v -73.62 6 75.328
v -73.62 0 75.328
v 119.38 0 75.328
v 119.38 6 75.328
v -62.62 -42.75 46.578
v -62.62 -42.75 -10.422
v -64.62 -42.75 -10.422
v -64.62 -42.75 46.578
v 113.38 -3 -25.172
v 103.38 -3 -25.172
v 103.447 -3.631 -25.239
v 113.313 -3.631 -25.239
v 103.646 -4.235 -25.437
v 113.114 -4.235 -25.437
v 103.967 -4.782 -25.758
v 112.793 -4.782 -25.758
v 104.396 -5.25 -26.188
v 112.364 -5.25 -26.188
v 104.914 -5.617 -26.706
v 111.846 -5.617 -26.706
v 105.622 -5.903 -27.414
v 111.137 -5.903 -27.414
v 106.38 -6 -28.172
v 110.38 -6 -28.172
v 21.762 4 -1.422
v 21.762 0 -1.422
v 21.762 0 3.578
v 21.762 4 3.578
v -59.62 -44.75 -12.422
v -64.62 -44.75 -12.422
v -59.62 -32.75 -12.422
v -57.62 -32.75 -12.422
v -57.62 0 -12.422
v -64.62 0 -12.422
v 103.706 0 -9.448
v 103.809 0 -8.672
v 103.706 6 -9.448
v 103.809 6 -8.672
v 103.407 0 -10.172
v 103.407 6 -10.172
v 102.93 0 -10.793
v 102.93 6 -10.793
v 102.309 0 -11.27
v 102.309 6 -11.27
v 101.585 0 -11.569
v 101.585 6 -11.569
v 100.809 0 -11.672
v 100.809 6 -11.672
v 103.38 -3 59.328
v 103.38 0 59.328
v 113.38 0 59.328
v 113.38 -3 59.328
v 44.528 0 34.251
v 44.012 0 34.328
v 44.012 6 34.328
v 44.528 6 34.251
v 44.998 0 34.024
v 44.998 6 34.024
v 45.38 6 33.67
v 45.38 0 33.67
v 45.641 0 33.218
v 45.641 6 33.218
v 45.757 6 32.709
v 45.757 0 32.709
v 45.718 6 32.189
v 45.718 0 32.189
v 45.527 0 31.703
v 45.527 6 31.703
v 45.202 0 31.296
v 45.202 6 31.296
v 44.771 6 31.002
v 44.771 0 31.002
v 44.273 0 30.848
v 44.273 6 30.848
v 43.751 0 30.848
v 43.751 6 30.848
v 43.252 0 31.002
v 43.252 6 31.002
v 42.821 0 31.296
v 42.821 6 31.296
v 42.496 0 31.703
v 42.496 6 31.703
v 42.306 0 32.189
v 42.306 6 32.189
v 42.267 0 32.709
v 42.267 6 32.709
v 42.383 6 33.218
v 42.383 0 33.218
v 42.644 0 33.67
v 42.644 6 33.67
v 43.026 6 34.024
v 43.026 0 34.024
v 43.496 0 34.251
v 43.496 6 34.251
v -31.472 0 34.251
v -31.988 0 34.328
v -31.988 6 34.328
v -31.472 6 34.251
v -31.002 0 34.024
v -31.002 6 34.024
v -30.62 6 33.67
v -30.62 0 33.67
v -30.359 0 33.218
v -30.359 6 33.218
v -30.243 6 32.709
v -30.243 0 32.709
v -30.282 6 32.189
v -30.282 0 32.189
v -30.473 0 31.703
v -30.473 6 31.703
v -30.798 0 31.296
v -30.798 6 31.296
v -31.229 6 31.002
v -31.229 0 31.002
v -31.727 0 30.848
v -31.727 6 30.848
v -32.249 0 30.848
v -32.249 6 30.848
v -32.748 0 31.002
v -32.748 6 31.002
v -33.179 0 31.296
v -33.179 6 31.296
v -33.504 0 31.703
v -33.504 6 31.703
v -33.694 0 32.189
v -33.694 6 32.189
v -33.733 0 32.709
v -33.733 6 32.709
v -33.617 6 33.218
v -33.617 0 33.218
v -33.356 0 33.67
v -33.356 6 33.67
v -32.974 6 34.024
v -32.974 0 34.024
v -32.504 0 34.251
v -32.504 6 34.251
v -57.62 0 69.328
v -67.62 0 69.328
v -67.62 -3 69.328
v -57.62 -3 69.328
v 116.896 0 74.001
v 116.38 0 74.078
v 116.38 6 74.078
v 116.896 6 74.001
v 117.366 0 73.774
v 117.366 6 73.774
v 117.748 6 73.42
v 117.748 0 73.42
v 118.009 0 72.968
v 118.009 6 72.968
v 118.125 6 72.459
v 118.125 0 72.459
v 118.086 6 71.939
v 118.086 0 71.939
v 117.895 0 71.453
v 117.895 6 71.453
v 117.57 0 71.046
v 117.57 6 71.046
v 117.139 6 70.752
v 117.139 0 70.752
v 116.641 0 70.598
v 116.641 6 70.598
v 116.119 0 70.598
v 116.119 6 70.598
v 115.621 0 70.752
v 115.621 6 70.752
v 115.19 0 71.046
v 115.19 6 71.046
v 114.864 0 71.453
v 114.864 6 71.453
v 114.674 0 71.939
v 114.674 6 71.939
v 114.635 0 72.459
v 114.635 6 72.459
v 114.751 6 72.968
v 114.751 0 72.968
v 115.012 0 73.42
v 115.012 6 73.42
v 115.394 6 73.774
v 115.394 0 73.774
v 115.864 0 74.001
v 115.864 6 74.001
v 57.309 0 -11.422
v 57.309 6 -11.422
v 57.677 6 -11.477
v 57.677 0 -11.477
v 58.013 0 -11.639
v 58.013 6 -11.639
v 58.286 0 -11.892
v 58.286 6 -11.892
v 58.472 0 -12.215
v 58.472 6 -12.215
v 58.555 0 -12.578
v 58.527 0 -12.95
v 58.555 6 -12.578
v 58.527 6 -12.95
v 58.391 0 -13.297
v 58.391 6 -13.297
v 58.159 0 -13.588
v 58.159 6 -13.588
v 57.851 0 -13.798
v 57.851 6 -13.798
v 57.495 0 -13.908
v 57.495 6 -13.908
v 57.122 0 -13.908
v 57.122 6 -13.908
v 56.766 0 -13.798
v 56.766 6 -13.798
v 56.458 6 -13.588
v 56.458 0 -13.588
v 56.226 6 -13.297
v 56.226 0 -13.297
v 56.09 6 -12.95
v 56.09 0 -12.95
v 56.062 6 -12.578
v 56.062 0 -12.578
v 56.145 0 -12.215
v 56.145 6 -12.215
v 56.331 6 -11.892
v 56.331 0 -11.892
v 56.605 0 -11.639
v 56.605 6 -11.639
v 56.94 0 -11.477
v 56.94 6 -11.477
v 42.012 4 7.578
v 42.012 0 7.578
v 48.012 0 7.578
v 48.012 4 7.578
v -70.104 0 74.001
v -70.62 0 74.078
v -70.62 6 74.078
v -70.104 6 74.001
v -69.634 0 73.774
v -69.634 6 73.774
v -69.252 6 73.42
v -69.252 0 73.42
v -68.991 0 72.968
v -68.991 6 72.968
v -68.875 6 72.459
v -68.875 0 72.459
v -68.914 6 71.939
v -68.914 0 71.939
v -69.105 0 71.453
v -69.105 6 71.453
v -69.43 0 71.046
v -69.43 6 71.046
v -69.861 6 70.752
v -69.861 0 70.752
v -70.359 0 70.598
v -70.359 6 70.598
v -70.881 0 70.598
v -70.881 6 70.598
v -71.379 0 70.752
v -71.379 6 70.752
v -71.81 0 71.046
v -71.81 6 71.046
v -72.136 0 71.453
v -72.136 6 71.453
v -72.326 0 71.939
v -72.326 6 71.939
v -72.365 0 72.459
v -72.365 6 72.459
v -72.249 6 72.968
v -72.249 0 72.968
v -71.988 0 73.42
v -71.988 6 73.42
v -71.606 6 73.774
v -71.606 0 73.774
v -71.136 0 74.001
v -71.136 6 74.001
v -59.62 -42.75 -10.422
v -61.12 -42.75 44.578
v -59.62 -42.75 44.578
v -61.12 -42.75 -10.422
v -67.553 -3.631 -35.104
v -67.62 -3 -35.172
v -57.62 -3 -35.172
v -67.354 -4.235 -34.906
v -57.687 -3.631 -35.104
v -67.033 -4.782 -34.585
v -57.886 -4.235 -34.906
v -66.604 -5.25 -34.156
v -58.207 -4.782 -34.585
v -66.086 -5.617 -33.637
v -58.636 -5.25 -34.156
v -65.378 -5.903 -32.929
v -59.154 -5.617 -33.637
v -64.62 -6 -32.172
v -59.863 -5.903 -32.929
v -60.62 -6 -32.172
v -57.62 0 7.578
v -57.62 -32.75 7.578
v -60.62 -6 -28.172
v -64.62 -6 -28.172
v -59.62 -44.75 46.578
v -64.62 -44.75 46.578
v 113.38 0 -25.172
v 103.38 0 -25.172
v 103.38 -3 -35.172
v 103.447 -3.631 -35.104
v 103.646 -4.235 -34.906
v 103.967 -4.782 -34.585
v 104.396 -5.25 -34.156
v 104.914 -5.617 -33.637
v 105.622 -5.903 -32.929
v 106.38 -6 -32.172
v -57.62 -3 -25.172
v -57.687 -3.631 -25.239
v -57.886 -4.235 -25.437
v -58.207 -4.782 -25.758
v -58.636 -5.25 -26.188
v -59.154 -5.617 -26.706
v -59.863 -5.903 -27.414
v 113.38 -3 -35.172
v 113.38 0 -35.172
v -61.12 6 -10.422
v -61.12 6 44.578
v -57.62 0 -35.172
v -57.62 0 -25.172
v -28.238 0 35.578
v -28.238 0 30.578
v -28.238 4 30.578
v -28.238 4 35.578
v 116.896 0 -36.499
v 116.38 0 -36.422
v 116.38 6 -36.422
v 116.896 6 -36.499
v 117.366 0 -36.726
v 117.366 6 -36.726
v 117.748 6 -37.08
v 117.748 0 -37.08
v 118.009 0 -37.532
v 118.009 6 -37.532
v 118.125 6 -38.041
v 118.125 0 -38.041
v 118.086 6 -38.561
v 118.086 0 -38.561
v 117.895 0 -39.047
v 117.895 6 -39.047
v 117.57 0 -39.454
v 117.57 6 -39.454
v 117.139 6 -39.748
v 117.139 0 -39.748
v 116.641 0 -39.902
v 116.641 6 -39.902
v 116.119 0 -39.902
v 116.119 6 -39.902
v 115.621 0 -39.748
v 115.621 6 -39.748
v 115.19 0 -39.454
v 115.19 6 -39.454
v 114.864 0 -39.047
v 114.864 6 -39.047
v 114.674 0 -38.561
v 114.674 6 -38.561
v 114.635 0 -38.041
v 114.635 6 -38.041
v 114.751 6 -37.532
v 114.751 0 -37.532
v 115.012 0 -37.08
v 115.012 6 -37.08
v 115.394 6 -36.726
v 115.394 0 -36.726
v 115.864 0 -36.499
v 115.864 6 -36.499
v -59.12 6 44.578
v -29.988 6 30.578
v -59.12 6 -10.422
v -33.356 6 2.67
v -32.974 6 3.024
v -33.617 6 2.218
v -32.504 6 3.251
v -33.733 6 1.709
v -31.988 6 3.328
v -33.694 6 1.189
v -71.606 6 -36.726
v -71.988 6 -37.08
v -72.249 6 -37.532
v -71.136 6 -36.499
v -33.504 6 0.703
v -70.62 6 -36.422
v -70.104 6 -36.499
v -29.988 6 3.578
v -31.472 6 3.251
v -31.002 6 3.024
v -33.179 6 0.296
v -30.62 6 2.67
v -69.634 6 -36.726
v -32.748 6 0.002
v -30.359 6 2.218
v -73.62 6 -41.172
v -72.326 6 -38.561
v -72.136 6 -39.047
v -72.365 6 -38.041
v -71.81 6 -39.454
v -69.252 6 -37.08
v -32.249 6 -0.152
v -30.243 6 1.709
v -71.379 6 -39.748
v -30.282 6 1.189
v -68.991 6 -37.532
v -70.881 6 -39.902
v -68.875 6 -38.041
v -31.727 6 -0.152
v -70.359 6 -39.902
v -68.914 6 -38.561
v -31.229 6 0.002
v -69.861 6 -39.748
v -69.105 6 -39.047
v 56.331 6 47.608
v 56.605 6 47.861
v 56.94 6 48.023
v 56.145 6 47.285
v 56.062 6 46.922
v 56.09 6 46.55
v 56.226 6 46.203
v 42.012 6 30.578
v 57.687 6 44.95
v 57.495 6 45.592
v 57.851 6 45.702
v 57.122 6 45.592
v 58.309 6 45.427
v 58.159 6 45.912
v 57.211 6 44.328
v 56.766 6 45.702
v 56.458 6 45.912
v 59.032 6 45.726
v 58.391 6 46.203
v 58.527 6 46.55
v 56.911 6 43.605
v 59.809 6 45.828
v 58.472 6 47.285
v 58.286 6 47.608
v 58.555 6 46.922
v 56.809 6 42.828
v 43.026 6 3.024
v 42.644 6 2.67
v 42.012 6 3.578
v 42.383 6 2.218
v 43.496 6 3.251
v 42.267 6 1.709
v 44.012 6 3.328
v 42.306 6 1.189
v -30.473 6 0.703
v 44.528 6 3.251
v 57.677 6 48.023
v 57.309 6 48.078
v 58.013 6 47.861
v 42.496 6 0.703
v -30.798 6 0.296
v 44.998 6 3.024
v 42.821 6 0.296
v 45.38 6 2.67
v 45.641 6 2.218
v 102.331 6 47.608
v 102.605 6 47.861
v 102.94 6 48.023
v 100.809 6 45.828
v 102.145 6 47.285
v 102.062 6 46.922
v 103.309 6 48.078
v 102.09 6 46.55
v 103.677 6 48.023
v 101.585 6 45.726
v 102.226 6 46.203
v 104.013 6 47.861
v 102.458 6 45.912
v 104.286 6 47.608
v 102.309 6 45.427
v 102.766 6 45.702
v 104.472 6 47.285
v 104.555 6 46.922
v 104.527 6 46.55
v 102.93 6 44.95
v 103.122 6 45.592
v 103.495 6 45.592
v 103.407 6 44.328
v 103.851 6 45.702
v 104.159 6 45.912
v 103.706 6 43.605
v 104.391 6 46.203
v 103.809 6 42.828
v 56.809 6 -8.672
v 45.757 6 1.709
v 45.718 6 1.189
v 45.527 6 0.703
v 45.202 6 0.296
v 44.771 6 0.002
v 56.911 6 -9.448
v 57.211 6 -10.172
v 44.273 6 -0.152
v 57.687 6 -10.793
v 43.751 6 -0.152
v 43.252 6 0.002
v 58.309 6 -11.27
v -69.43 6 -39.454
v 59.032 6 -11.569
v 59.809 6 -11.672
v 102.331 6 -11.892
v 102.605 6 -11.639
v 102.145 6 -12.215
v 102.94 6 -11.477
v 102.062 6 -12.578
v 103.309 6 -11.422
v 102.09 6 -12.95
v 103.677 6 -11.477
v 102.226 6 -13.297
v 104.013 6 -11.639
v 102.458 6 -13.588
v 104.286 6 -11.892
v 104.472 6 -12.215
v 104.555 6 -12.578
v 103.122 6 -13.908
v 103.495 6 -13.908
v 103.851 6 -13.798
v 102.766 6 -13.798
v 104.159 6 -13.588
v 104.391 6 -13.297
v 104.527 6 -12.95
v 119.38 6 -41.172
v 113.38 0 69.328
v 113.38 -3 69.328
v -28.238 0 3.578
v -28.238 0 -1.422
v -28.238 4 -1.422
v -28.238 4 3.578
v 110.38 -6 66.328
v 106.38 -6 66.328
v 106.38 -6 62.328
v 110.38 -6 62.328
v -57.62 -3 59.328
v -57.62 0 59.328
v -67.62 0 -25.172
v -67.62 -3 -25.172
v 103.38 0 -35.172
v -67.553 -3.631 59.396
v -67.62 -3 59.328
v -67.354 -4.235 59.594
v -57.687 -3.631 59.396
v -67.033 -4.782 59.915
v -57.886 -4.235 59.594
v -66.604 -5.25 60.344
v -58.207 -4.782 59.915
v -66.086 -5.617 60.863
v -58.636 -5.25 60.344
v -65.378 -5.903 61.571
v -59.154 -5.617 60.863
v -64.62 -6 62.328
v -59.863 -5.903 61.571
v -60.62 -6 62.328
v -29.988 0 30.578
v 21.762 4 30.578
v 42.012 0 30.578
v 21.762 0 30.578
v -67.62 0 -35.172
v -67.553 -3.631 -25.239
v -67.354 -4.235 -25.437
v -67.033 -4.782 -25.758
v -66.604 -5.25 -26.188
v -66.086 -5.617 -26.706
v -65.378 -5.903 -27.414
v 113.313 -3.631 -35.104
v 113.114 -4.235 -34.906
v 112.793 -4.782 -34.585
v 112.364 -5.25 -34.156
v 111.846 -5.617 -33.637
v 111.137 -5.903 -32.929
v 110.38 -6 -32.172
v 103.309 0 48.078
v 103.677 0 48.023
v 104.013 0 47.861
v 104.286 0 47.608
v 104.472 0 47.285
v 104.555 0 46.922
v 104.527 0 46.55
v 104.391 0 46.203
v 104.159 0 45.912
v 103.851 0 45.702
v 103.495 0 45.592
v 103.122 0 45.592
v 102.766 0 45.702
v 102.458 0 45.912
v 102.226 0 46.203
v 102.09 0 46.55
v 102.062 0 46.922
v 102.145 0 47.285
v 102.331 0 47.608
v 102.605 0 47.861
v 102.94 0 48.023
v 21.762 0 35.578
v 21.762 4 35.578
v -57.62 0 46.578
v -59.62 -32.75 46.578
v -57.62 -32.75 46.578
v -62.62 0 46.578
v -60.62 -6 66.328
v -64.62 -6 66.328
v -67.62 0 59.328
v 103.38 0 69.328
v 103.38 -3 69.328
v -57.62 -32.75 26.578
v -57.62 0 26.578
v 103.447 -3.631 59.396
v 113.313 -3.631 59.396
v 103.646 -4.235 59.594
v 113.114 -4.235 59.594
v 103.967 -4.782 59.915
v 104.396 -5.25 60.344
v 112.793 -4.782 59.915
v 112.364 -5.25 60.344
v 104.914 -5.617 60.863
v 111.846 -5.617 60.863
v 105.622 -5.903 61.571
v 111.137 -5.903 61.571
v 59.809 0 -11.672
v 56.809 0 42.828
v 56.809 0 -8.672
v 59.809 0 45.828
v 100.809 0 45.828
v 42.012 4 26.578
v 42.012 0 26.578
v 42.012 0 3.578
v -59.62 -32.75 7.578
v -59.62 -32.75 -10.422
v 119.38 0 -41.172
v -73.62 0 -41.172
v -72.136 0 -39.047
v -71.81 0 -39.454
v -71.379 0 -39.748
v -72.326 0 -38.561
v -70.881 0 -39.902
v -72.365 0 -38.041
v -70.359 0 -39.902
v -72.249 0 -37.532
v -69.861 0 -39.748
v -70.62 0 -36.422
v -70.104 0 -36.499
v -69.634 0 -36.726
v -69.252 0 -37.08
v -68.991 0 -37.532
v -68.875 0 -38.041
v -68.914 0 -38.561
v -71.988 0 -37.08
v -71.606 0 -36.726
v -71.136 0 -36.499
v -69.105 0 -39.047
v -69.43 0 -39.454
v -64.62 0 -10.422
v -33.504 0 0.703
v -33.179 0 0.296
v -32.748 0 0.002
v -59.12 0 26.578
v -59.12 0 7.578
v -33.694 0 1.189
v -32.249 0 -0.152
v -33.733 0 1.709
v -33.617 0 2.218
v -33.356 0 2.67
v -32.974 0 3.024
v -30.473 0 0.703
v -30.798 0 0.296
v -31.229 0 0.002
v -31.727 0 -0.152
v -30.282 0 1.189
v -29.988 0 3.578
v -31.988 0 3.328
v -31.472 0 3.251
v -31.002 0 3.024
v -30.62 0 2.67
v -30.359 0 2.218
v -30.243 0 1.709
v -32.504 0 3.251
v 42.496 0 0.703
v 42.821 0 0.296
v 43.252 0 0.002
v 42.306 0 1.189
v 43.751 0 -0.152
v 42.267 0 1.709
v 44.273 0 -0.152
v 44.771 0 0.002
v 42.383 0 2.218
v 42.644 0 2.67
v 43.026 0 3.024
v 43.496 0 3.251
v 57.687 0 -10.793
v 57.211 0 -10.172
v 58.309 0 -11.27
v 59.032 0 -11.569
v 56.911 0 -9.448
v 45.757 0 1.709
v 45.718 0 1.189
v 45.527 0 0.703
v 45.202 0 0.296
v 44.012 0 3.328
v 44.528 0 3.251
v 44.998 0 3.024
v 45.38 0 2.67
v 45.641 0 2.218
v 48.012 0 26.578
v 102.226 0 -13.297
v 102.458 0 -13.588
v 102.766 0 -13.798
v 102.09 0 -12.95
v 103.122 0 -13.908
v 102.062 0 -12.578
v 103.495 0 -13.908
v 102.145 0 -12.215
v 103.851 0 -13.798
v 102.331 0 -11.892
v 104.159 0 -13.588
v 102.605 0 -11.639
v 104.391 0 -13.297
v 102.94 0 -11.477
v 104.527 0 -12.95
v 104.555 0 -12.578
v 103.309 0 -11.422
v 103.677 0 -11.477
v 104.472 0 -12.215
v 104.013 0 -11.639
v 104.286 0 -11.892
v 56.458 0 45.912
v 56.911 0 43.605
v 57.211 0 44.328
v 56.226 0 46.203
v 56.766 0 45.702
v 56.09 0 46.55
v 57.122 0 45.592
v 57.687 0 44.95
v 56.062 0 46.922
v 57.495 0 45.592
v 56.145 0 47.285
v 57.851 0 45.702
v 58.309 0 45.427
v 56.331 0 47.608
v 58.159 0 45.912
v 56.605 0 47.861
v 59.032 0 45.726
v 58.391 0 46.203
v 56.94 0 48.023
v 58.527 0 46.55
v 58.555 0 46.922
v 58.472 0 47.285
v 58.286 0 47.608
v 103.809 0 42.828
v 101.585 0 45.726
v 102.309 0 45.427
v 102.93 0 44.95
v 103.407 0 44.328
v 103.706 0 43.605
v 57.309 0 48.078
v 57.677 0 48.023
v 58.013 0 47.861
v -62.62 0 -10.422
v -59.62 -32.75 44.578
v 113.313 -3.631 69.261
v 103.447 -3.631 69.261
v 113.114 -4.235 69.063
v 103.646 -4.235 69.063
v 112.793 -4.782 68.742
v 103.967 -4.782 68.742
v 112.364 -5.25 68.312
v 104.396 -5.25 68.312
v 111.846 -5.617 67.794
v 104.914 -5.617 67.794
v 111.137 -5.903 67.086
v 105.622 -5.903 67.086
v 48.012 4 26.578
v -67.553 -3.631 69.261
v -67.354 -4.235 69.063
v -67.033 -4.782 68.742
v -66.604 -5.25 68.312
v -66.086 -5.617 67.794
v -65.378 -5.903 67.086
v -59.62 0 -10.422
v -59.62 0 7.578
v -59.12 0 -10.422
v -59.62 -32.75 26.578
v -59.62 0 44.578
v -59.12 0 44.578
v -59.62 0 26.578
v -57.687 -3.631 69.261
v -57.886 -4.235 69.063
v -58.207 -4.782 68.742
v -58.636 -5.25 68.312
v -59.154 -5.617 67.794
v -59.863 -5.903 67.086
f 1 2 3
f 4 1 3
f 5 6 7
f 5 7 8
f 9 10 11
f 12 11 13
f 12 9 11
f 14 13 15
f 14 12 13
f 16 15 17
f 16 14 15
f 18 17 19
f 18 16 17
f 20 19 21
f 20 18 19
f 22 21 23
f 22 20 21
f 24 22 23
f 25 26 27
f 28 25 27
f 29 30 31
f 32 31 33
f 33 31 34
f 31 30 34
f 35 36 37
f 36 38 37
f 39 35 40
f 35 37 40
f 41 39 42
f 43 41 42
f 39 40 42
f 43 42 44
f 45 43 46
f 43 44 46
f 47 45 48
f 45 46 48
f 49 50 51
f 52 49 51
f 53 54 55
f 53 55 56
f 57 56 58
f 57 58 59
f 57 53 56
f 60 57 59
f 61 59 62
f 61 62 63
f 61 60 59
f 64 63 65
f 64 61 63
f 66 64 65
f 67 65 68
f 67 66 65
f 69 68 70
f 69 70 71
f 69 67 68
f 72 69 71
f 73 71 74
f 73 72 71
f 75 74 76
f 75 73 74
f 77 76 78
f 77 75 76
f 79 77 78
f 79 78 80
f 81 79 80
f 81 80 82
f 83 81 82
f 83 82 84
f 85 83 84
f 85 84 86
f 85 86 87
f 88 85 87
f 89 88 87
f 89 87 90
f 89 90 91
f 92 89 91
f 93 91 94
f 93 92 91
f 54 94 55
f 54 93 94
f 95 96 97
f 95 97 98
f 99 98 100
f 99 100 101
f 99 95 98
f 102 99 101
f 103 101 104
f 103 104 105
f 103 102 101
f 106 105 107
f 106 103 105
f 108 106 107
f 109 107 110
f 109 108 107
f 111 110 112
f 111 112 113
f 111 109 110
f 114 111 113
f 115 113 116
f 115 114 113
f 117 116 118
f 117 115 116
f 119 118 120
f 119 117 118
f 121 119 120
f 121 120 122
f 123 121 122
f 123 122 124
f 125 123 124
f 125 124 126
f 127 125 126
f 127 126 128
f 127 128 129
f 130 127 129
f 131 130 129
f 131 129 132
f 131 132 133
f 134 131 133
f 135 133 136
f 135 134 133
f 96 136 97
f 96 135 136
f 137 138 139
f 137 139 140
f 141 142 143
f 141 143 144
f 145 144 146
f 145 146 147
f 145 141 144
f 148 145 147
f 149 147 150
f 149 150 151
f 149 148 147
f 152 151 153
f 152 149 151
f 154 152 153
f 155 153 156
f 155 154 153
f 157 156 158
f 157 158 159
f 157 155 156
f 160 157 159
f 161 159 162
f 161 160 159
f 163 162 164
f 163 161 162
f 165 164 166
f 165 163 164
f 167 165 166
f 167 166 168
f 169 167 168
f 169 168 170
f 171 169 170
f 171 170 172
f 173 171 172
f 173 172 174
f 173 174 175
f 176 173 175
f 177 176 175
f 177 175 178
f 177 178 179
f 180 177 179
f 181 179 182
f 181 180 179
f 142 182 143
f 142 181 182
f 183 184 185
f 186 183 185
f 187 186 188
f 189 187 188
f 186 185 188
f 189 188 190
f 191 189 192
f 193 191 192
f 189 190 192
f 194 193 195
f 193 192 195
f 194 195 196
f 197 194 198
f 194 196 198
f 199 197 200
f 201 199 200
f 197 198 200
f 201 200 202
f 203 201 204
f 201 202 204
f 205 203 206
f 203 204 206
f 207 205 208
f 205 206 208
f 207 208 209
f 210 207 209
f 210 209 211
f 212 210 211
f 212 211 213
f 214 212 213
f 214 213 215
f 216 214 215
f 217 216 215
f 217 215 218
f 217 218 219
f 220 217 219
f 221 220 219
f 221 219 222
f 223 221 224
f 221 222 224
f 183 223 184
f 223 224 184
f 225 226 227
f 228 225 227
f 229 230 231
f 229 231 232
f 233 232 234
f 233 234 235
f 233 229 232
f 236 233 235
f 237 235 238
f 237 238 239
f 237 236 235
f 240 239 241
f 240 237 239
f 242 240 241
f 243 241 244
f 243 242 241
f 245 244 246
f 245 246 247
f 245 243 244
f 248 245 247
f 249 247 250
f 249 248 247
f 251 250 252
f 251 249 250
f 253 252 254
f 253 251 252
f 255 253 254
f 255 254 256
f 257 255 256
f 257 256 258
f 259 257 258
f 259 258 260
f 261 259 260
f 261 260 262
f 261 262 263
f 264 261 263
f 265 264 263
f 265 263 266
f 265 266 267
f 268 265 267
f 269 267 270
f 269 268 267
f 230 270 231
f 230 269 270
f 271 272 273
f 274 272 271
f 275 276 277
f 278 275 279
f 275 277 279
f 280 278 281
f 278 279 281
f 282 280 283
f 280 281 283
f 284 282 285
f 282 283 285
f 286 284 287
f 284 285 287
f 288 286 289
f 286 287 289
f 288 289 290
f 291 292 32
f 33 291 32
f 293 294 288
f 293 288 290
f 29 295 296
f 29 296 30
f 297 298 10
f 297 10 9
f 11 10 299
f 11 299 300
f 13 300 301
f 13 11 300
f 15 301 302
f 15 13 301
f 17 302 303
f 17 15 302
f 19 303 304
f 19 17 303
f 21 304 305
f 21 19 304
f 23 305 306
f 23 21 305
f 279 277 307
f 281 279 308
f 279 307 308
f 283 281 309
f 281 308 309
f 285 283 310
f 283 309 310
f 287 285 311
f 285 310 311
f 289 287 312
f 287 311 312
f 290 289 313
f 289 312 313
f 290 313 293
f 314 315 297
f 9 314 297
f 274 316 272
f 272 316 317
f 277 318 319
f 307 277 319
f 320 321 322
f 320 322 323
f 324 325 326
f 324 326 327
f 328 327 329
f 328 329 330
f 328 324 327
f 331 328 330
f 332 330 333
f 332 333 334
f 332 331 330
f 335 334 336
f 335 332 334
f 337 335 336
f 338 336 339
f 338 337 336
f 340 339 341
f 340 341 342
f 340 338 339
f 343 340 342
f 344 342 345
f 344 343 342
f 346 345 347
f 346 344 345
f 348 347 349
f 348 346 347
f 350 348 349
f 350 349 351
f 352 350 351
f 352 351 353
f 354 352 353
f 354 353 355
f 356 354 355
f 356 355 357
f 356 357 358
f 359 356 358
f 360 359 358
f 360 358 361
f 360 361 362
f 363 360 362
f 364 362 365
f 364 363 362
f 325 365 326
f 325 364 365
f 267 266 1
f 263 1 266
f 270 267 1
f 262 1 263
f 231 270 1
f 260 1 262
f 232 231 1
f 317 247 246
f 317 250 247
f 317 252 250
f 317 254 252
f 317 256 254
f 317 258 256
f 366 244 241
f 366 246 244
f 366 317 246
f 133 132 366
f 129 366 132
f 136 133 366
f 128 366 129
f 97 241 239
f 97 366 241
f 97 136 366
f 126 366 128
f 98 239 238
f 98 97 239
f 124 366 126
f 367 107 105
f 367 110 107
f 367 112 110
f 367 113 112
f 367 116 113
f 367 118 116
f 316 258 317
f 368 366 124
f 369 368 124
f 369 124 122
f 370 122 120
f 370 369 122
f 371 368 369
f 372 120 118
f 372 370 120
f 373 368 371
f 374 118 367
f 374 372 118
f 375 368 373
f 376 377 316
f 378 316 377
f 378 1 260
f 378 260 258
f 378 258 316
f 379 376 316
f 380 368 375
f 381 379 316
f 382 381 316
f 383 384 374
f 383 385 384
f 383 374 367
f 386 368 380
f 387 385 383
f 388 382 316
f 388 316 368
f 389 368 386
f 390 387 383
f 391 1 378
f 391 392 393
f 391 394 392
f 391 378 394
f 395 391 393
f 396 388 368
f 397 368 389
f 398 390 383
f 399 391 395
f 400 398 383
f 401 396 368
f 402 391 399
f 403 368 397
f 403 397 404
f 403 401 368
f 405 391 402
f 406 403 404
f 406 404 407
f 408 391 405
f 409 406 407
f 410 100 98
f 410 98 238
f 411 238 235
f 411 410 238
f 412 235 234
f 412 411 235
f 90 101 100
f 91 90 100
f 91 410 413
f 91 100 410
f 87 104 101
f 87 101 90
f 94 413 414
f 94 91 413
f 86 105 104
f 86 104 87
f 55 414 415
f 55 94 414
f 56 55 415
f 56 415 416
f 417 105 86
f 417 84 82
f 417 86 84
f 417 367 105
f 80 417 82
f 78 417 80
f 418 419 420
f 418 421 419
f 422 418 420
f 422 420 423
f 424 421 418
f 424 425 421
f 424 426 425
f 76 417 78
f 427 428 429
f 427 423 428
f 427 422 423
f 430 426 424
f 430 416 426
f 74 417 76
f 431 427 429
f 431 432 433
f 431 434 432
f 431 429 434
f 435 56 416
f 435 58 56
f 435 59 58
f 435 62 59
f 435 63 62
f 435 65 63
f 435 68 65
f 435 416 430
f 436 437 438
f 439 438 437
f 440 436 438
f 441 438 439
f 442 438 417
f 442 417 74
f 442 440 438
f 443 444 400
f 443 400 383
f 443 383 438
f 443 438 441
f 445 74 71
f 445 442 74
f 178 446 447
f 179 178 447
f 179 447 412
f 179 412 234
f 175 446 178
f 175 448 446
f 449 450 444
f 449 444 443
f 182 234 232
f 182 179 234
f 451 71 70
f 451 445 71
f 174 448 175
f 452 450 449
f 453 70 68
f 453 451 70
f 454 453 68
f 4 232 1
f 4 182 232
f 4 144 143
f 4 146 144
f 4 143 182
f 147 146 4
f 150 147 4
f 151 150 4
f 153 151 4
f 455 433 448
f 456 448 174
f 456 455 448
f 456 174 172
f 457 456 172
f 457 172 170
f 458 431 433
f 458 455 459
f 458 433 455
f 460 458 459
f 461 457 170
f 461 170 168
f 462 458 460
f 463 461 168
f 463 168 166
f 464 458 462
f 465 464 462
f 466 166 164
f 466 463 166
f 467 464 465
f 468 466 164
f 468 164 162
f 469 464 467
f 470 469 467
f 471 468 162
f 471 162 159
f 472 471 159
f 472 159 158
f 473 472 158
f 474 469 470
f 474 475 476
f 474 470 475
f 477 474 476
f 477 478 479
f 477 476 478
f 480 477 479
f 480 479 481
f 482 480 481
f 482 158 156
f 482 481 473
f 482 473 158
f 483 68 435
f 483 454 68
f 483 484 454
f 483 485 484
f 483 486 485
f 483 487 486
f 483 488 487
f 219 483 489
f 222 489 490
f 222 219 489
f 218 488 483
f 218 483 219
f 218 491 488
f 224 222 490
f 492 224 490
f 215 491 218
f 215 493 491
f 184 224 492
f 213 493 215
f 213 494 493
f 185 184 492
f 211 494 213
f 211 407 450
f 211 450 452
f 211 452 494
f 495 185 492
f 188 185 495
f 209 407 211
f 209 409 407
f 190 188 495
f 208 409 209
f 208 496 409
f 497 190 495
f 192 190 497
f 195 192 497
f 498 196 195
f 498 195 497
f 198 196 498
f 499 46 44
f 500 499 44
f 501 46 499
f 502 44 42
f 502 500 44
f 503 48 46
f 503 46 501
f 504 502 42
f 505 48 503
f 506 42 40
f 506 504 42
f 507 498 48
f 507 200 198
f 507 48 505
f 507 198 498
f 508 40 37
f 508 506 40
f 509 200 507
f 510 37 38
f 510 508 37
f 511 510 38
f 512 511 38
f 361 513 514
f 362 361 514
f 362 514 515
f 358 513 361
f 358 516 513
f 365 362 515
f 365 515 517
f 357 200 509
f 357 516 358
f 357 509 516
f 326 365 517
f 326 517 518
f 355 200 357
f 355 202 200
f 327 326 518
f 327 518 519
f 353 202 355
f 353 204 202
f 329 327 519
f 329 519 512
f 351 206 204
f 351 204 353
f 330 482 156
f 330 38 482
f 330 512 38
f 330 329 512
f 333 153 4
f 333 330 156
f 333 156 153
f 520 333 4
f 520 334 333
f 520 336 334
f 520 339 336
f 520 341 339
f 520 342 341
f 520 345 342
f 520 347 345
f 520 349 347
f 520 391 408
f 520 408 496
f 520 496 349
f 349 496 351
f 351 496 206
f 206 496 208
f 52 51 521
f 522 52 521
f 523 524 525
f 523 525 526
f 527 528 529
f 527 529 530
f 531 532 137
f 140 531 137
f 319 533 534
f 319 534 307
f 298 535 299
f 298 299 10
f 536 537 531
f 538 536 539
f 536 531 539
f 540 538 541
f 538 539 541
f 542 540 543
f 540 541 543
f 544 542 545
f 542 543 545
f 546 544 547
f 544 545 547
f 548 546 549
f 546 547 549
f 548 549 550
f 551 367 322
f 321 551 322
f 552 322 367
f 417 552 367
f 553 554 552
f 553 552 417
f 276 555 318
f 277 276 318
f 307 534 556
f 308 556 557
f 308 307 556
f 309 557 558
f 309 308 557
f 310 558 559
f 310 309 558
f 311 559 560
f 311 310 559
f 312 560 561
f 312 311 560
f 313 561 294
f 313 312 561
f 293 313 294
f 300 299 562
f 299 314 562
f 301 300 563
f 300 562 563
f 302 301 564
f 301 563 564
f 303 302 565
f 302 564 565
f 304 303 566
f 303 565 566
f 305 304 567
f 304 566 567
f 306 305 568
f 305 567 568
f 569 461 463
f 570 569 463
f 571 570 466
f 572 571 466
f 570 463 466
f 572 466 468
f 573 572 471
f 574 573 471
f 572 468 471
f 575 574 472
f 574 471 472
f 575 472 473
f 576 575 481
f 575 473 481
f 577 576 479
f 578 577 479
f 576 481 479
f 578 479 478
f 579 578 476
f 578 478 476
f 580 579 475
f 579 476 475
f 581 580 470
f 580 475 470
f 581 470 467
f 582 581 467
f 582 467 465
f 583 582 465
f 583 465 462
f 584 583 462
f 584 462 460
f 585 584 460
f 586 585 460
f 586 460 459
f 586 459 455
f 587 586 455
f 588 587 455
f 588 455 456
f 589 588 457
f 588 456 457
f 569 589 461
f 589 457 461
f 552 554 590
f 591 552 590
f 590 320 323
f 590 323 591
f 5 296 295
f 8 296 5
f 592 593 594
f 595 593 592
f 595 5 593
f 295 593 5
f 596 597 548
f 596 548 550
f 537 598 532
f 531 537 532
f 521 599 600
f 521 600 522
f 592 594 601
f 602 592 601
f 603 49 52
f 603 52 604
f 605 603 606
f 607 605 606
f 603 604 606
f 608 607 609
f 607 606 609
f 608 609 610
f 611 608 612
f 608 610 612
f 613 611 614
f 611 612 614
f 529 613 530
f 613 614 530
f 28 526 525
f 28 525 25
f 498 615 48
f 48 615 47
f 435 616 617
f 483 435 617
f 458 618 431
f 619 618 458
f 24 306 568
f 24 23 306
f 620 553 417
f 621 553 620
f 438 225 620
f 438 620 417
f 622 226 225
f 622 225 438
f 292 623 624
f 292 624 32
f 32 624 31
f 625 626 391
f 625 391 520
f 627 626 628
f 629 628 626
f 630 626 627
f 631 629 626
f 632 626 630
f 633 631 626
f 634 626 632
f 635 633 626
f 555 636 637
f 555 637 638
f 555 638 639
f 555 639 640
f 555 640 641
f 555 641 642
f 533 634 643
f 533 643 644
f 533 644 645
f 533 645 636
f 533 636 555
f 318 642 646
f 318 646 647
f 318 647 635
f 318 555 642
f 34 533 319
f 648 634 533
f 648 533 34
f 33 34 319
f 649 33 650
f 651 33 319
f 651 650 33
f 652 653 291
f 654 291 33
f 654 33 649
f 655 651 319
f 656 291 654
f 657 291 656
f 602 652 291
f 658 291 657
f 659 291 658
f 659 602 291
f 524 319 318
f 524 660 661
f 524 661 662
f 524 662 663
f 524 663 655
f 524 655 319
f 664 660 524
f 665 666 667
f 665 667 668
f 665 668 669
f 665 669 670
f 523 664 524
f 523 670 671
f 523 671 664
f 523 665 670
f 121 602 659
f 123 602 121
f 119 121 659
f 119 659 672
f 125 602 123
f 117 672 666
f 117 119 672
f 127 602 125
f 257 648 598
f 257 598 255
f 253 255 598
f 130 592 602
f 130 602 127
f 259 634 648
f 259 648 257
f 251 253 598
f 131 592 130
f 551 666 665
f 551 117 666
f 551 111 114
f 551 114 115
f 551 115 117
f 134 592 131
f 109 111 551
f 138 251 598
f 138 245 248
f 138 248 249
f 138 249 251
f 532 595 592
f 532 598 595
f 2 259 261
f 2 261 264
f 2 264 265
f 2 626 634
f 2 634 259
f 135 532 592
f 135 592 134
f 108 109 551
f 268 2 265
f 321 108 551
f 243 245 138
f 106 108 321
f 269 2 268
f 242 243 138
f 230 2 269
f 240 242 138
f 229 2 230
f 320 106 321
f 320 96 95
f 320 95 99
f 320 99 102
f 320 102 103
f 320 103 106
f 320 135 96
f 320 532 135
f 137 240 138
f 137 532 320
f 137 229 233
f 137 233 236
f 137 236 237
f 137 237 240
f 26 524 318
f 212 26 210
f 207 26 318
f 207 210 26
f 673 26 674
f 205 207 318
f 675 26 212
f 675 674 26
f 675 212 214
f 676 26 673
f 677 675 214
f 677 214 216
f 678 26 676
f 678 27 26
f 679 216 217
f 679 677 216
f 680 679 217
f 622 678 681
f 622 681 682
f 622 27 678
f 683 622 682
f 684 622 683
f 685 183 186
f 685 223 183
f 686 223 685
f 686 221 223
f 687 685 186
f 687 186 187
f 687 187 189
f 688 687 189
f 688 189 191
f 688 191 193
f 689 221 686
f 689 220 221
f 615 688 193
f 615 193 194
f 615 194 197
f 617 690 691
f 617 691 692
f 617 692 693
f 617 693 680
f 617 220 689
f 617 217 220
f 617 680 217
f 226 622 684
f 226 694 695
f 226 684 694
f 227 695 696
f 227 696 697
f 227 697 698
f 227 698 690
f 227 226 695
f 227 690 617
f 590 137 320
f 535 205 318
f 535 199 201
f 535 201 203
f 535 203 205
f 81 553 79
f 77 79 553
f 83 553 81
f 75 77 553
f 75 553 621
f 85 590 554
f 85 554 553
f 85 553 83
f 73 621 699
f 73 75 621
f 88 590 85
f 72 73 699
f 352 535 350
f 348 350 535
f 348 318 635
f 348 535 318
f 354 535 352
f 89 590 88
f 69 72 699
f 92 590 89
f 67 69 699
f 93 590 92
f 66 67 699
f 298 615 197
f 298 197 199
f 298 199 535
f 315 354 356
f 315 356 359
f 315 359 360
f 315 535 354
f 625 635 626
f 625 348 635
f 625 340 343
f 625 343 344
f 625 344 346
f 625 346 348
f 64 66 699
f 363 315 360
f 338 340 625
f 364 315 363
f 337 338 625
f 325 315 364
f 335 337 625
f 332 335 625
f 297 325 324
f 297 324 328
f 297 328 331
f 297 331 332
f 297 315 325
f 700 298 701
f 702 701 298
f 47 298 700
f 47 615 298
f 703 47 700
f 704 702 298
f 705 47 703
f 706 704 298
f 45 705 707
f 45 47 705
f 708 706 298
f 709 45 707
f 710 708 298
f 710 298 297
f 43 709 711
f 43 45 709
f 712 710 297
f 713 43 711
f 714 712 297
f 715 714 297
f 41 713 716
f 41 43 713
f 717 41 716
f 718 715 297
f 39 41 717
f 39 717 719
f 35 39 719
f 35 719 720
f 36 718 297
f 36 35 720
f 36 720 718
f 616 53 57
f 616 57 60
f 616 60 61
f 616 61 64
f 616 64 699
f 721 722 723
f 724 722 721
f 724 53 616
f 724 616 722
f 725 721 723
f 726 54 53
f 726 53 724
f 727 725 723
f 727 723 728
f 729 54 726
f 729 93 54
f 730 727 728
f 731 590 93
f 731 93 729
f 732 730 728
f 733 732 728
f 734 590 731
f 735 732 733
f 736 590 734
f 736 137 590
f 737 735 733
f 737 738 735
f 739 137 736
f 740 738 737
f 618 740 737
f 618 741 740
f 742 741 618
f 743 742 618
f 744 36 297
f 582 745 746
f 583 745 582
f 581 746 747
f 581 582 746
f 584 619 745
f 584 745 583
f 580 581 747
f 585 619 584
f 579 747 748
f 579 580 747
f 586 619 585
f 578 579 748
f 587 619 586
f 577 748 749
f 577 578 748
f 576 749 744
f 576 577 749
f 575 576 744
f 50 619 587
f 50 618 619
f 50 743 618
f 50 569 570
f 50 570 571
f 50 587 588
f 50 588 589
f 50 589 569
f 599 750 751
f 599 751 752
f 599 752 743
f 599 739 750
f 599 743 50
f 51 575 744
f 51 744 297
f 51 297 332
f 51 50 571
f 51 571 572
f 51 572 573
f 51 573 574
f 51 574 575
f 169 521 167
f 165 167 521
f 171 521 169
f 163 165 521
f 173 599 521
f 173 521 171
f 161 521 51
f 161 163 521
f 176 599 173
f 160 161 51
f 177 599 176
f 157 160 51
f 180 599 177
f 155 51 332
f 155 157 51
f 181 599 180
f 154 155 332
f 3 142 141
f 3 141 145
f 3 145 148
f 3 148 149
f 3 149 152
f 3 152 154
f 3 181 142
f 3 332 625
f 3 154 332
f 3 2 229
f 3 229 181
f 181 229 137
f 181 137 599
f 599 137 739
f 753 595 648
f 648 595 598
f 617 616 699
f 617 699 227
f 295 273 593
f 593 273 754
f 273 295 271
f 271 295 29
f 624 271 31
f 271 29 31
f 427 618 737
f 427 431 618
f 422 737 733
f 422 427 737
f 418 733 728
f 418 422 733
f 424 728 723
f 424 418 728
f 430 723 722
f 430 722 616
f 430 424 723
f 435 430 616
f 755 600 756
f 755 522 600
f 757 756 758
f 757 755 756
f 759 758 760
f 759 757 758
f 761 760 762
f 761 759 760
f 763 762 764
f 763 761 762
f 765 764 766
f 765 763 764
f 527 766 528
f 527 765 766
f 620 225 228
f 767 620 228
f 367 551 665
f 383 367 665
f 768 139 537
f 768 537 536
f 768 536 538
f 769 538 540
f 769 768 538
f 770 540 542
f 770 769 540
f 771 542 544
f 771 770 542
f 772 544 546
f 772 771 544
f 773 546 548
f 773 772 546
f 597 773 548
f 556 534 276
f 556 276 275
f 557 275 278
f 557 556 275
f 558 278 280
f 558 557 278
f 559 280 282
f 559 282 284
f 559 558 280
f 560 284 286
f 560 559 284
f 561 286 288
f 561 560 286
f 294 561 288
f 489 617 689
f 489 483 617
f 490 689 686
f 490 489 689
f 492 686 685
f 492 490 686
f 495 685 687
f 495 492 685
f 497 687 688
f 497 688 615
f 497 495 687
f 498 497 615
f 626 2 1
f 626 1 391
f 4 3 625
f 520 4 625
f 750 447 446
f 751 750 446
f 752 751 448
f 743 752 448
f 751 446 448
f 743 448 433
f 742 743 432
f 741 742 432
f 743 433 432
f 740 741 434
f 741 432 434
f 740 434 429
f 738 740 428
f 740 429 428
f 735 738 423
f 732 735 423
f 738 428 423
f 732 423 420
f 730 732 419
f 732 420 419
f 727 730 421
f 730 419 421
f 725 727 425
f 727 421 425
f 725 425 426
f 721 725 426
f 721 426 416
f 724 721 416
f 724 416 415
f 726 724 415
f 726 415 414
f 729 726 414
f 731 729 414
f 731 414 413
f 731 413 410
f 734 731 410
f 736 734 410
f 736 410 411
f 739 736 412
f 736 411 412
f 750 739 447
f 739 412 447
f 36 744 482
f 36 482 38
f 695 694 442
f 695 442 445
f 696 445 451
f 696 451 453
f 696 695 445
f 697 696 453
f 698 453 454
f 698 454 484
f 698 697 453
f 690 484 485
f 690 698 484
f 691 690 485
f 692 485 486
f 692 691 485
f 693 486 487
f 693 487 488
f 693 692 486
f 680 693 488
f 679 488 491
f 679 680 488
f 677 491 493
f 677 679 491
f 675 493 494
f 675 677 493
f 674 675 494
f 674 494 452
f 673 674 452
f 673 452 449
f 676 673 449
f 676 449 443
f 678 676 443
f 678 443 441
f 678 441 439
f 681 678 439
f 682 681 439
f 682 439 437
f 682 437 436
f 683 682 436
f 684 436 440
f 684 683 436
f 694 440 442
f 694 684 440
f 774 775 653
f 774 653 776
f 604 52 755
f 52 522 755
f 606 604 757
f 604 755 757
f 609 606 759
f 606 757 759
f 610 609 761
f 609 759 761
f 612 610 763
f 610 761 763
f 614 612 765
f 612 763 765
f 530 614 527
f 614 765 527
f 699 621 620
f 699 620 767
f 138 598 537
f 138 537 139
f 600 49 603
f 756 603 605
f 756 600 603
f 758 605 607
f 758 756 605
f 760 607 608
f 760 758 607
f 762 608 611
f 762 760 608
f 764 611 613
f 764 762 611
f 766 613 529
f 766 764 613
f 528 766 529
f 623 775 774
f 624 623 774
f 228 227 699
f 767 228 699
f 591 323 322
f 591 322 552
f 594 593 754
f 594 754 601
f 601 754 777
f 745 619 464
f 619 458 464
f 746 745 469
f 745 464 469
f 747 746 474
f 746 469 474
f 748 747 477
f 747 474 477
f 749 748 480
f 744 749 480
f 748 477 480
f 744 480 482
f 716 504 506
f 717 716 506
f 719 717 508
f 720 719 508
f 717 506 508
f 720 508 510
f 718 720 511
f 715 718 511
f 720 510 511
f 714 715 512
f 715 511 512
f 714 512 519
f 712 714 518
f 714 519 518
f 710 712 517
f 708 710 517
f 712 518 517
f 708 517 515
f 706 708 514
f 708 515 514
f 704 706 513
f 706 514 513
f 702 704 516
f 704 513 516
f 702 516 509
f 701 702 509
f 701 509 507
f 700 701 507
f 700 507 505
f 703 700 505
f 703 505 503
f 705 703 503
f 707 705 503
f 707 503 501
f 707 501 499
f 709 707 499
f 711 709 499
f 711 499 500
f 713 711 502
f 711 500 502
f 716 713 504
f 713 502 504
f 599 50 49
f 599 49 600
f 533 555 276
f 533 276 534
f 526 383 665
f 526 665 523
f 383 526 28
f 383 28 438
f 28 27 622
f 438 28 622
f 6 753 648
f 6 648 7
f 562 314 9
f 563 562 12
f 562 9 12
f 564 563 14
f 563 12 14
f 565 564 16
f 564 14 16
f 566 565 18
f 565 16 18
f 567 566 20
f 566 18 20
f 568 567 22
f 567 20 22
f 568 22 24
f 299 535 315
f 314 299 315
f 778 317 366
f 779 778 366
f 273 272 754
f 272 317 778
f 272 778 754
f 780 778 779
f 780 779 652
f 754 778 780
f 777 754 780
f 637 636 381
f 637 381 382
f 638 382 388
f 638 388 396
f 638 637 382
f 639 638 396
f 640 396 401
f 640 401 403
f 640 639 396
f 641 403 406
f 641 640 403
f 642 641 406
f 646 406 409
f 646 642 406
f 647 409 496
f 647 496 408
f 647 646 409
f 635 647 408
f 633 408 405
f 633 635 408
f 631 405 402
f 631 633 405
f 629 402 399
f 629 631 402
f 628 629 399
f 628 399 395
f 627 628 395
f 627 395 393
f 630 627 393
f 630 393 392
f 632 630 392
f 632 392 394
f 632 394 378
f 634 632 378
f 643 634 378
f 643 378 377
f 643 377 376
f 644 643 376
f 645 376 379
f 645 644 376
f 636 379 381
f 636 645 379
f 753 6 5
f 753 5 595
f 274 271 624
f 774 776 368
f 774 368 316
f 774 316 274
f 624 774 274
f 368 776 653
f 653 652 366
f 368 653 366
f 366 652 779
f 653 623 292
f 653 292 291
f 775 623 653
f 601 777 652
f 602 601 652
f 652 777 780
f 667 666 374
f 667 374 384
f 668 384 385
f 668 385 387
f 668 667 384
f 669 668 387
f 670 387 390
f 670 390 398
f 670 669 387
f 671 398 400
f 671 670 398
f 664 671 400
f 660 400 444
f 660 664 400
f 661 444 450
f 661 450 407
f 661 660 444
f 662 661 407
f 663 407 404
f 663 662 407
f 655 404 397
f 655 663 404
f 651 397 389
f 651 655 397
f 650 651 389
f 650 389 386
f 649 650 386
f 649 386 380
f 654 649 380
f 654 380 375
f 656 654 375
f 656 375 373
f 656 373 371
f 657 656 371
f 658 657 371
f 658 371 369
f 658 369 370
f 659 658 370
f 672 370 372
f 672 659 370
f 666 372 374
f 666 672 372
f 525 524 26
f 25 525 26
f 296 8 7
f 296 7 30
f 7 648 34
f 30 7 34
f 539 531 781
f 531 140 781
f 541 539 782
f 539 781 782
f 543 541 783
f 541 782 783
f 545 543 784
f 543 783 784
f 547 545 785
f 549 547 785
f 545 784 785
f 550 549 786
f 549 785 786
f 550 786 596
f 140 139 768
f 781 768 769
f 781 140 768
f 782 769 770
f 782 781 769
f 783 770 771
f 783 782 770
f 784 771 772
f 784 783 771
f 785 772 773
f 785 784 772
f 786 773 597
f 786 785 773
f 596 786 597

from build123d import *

# Parameters (mm, degrees)
SKETCH1_W            = 193
SKETCH1_H            = 116.5
SKETCH1_R            = 1.75
SKETCH1_W_2          = 47
SKETCH1_H_2          = 57.5
SKETCH1_W_3          = 72
SKETCH1_H_3          = 27
SKETCH1_W_4          = 2
SKETCH1_H_4          = 55
BOSS_EXTRUDE1_DEPTH  = 6
SKETCH3_W            = 10
SKETCH3_H            = 10
BOSS_EXTRUDE3_DEPTH  = 10
FILLET1_R            = 3
SKETCH5_W            = 2
SKETCH5_H            = 55
BOSS_EXTRUDE4_DEPTH  = 6
SKETCH6_W            = 181
SKETCH6_H            = 104.5
CUT_EXTRUDE1_DEPTH   = 4
SKETCH7_W            = 1.5
SKETCH7_H            = 55
BOSS_EXTRUDE5_DEPTH  = 44.75
SKETCH8_W            = 2
SKETCH8_H            = 55
CUT_EXTRUDE2_DEPTH   = 42.25
SKETCH10_W           = 6
SKETCH10_H           = 19
CUT_EXTRUDE3_DEPTH   = 4
FILLET3_R            = 3
SKETCH12_W           = 55
SKETCH12_H           = 2
BOSS_EXTRUDE6_DEPTH  = 1.5
SKETCH14_W           = 3
SKETCH14_H           = 44.75
BOSS_EXTRUDE7_DEPTH  = 2
SKETCH15_W           = 3
SKETCH15_H           = 44.75
BOSS_EXTRUDE8_DEPTH  = 2
BOSS_EXTRUDE9_DEPTH  = 2
SKETCH17_R           = 1.25
CUT_EXTRUDE5_DEPTH   = 6
SKETCH18_W           = 20
SKETCH18_H           = 32.75
BOSS_EXTRUDE10_DEPTH = 2
SKETCH19_W           = 50
SKETCH19_H           = 37
CUT_EXTRUDE7_DEPTH   = 4


with BuildPart() as part:
    # Sketch1 → Boss-Extrude1 (new body)
    with BuildSketch(Plane(origin=(0, 0, 0), x_dir=(1, 0, 0), z_dir=(0, 1, 0))):
        with Locations((22.87983871, -17.078434096)):
            Rectangle(SKETCH1_W, SKETCH1_H)
        with Locations(Location((-31.988235573, -1.578434096, 0), (0, 0, 270))):
            Circle(SKETCH1_R, mode=Mode.SUBTRACT)
        with Locations(Location((-31.988235573, -32.578434096, 0), (0, 0, 270))):
            Circle(SKETCH1_R, mode=Mode.SUBTRACT)
        with Locations(Location((44.011764427, -1.578434096, 0), (0, 0, 270))):
            Circle(SKETCH1_R, mode=Mode.SUBTRACT)
        with Locations(Location((44.011764427, -32.578434096, 0), (0, 0, 270))):
            Circle(SKETCH1_R, mode=Mode.SUBTRACT)
        with Locations(Location((-70.62016129, -72.328434096, 0), (0, 0, 270))):
            Circle(SKETCH1_R, mode=Mode.SUBTRACT)
        with Locations(Location((-70.62016129, 38.171565904, 0), (0, 0, 270))):
            Circle(SKETCH1_R, mode=Mode.SUBTRACT)
        with Locations(Location((116.37983871, -72.328434096, 0), (0, 0, 270))):
            Circle(SKETCH1_R, mode=Mode.SUBTRACT)
        with Locations(Location((116.37983871, 38.171565904, 0), (0, 0, 270))):
            Circle(SKETCH1_R, mode=Mode.SUBTRACT)
        with Locations((80.308659112, -17.078434096)):
            Rectangle(SKETCH1_W_2, SKETCH1_H_2, mode=Mode.SUBTRACT)
        with Locations((6.011764427, -17.078434096)):
            Rectangle(SKETCH1_W_3, SKETCH1_H_3, mode=Mode.SUBTRACT)
        with Locations((-47.331266899, -17.078434096)):
            Rectangle(SKETCH1_W_4, SKETCH1_H_4, mode=Mode.SUBTRACT)
    extrude(amount=BOSS_EXTRUDE1_DEPTH)

    # Sketch3 → Boss-Extrude3 (add)
    with BuildSketch(Plane.XZ):
        with Locations((-62.62016129, 64.328434096)):
            Rectangle(SKETCH3_W, SKETCH3_H)
        with Locations((-62.62016129, -30.171565904)):
            Rectangle(SKETCH3_W, SKETCH3_H)
        with Locations((108.37983871, -30.171565904)):
            Rectangle(SKETCH3_W, SKETCH3_H)
        with Locations((108.37983871, 64.328434096)):
            Rectangle(SKETCH3_W, SKETCH3_H)
    extrude(amount=BOSS_EXTRUDE3_DEPTH)

    # Fillet1
    fillet1_edges = [part.edges().sort_by_distance(p)[0] for p in [
        (56.808659112, 3, -11.671565904),
        (56.808659112, 3, 45.828434096),
        (103.808659112, 3, 45.828434096),
        (103.808659112, 3, -11.671565904),
    ]]
    fillet(fillet1_edges, radius=FILLET1_R)

    # Sketch5 → Boss-Extrude4 (add)
    with BuildSketch(Plane.XZ):
        with Locations((-47.331266899, 17.078434096)):
            Rectangle(SKETCH5_W, SKETCH5_H)
    extrude(amount=-BOSS_EXTRUDE4_DEPTH)

    # Sketch6 → Cut-Extrude1 (cut)
    with BuildSketch(Plane.XZ.offset(10)):
        with Locations((22.87983871, 17.078434096)):
            Rectangle(SKETCH6_W, SKETCH6_H)
    extrude(amount=-CUT_EXTRUDE1_DEPTH, mode=Mode.SUBTRACT)

    # Sketch7 → Boss-Extrude5 (add)
    with BuildSketch(Plane.XZ):
        with Locations((-61.87016129, 17.078434096)):
            Rectangle(SKETCH7_W, SKETCH7_H)
    extrude(amount=BOSS_EXTRUDE5_DEPTH)

    # Sketch8 → Cut-Extrude2 (cut)
    with BuildSketch(Plane.XZ):
        with Locations((-60.12016129, 17.078434096)):
            Rectangle(SKETCH8_W, SKETCH8_H)
    extrude(amount=-CUT_EXTRUDE2_DEPTH, mode=Mode.SUBTRACT)

    # Sketch10 → Cut-Extrude3 (cut)
    with BuildSketch(Plane.XZ):
        with Locations((45.011764427, 17.078434096)):
            Rectangle(SKETCH10_W, SKETCH10_H)
    extrude(amount=-CUT_EXTRUDE3_DEPTH, mode=Mode.SUBTRACT)

    # Fillet3
    fillet3_edges = [part.edges().sort_by_distance(p)[0] for p in [
        (-67.62016129, -6, 64.328434096),
        (-67.62016129, -6, -30.171565904),
        (-62.62016129, -6, -35.171565904),
        (108.37983871, -6, -35.171565904),
        (-62.62016129, -6, 69.328434096),
        (108.37983871, -6, 69.328434096),
        (113.37983871, -6, -30.171565904),
        (113.37983871, -6, 64.328434096),
        (-62.62016129, -6, 59.328434096),
        (-57.62016129, -6, 64.328434096),
        (103.37983871, -6, 64.328434096),
        (108.37983871, -6, 59.328434096),
        (108.37983871, -6, -25.171565904),
        (103.37983871, -6, -30.171565904),
        (-57.62016129, -6, -30.171565904),
        (-62.62016129, -6, -25.171565904),
    ]]
    fillet(fillet3_edges, radius=FILLET3_R)

    # Sketch12 → Boss-Extrude6 (add)
    with BuildSketch(Plane(origin=(-61.12016129, 0, 0), x_dir=(0, 0, -1), z_dir=(1, 0, 0))):
        with Locations((-17.078434096, -43.75)):
            Rectangle(SKETCH12_W, SKETCH12_H)
    extrude(amount=BOSS_EXTRUDE6_DEPTH)

    # Sketch14 → Boss-Extrude7 (add)
    with BuildSketch(Plane(origin=(0, 0, -10.421565904), x_dir=(-1, 0, 0), z_dir=(0, 0, -1))):
        with Locations((61.12016129, -22.375)):
            Rectangle(SKETCH14_W, SKETCH14_H)
    extrude(amount=BOSS_EXTRUDE7_DEPTH)

    # Sketch15 → Boss-Extrude8 (add)
    with BuildSketch(Plane.XY.offset(44.578434096)):
        with Locations((-61.12016129, -22.375)):
            Rectangle(SKETCH15_W, SKETCH15_H)
    extrude(amount=BOSS_EXTRUDE8_DEPTH)

    # Sketch16 → Boss-Extrude9 (add)
    with BuildSketch(Plane.ZY.offset(62.62016129)):
        Polygon((-10.421565904, 0), (-10.421565904, -42.75), (46.578434096, -42.75), (46.578434096, -44.75), (-12.421565904, -44.75), (-12.421565904, 0), align=None)
    extrude(amount=BOSS_EXTRUDE9_DEPTH)

    # Sketch17 → Cut-Extrude5 (cut)
    with BuildSketch(Plane(origin=(0, 6, 0), x_dir=(1, 0, 0), z_dir=(0, 1, 0))):
        with Locations(Location((57.308659112, 12.671565904, 0), (0, 0, 270))):
            Circle(SKETCH17_R)
        with Locations(Location((103.308659112, 12.671565904, 0), (0, 0, 270))):
            Circle(SKETCH17_R)
        with Locations(Location((57.308659112, -46.828434096, 0), (0, 0, 270))):
            Circle(SKETCH17_R)
        with Locations(Location((103.308659112, -46.828434096, 0), (0, 0, 270))):
            Circle(SKETCH17_R)
    extrude(amount=-CUT_EXTRUDE5_DEPTH, mode=Mode.SUBTRACT)

    # Sketch18 → Boss-Extrude10 (add)
    with BuildSketch(Plane(origin=(-59.62016129, 0, 0), x_dir=(0, 0, -1), z_dir=(1, 0, 0))):
        with Locations((-36.578434096, -16.375)):
            Rectangle(SKETCH18_W, SKETCH18_H)
        with Locations((2.421565904, -16.375)):
            Rectangle(SKETCH18_W, SKETCH18_H)
    extrude(amount=BOSS_EXTRUDE10_DEPTH)

    # Sketch19 → Cut-Extrude7 (cut)
    with BuildSketch(Plane.XZ):
        with Locations((-3.238235573, 17.078434096)):
            Rectangle(SKETCH19_W, SKETCH19_H)
    extrude(amount=-CUT_EXTRUDE7_DEPTH, mode=Mode.SUBTRACT)


solid = part.part
